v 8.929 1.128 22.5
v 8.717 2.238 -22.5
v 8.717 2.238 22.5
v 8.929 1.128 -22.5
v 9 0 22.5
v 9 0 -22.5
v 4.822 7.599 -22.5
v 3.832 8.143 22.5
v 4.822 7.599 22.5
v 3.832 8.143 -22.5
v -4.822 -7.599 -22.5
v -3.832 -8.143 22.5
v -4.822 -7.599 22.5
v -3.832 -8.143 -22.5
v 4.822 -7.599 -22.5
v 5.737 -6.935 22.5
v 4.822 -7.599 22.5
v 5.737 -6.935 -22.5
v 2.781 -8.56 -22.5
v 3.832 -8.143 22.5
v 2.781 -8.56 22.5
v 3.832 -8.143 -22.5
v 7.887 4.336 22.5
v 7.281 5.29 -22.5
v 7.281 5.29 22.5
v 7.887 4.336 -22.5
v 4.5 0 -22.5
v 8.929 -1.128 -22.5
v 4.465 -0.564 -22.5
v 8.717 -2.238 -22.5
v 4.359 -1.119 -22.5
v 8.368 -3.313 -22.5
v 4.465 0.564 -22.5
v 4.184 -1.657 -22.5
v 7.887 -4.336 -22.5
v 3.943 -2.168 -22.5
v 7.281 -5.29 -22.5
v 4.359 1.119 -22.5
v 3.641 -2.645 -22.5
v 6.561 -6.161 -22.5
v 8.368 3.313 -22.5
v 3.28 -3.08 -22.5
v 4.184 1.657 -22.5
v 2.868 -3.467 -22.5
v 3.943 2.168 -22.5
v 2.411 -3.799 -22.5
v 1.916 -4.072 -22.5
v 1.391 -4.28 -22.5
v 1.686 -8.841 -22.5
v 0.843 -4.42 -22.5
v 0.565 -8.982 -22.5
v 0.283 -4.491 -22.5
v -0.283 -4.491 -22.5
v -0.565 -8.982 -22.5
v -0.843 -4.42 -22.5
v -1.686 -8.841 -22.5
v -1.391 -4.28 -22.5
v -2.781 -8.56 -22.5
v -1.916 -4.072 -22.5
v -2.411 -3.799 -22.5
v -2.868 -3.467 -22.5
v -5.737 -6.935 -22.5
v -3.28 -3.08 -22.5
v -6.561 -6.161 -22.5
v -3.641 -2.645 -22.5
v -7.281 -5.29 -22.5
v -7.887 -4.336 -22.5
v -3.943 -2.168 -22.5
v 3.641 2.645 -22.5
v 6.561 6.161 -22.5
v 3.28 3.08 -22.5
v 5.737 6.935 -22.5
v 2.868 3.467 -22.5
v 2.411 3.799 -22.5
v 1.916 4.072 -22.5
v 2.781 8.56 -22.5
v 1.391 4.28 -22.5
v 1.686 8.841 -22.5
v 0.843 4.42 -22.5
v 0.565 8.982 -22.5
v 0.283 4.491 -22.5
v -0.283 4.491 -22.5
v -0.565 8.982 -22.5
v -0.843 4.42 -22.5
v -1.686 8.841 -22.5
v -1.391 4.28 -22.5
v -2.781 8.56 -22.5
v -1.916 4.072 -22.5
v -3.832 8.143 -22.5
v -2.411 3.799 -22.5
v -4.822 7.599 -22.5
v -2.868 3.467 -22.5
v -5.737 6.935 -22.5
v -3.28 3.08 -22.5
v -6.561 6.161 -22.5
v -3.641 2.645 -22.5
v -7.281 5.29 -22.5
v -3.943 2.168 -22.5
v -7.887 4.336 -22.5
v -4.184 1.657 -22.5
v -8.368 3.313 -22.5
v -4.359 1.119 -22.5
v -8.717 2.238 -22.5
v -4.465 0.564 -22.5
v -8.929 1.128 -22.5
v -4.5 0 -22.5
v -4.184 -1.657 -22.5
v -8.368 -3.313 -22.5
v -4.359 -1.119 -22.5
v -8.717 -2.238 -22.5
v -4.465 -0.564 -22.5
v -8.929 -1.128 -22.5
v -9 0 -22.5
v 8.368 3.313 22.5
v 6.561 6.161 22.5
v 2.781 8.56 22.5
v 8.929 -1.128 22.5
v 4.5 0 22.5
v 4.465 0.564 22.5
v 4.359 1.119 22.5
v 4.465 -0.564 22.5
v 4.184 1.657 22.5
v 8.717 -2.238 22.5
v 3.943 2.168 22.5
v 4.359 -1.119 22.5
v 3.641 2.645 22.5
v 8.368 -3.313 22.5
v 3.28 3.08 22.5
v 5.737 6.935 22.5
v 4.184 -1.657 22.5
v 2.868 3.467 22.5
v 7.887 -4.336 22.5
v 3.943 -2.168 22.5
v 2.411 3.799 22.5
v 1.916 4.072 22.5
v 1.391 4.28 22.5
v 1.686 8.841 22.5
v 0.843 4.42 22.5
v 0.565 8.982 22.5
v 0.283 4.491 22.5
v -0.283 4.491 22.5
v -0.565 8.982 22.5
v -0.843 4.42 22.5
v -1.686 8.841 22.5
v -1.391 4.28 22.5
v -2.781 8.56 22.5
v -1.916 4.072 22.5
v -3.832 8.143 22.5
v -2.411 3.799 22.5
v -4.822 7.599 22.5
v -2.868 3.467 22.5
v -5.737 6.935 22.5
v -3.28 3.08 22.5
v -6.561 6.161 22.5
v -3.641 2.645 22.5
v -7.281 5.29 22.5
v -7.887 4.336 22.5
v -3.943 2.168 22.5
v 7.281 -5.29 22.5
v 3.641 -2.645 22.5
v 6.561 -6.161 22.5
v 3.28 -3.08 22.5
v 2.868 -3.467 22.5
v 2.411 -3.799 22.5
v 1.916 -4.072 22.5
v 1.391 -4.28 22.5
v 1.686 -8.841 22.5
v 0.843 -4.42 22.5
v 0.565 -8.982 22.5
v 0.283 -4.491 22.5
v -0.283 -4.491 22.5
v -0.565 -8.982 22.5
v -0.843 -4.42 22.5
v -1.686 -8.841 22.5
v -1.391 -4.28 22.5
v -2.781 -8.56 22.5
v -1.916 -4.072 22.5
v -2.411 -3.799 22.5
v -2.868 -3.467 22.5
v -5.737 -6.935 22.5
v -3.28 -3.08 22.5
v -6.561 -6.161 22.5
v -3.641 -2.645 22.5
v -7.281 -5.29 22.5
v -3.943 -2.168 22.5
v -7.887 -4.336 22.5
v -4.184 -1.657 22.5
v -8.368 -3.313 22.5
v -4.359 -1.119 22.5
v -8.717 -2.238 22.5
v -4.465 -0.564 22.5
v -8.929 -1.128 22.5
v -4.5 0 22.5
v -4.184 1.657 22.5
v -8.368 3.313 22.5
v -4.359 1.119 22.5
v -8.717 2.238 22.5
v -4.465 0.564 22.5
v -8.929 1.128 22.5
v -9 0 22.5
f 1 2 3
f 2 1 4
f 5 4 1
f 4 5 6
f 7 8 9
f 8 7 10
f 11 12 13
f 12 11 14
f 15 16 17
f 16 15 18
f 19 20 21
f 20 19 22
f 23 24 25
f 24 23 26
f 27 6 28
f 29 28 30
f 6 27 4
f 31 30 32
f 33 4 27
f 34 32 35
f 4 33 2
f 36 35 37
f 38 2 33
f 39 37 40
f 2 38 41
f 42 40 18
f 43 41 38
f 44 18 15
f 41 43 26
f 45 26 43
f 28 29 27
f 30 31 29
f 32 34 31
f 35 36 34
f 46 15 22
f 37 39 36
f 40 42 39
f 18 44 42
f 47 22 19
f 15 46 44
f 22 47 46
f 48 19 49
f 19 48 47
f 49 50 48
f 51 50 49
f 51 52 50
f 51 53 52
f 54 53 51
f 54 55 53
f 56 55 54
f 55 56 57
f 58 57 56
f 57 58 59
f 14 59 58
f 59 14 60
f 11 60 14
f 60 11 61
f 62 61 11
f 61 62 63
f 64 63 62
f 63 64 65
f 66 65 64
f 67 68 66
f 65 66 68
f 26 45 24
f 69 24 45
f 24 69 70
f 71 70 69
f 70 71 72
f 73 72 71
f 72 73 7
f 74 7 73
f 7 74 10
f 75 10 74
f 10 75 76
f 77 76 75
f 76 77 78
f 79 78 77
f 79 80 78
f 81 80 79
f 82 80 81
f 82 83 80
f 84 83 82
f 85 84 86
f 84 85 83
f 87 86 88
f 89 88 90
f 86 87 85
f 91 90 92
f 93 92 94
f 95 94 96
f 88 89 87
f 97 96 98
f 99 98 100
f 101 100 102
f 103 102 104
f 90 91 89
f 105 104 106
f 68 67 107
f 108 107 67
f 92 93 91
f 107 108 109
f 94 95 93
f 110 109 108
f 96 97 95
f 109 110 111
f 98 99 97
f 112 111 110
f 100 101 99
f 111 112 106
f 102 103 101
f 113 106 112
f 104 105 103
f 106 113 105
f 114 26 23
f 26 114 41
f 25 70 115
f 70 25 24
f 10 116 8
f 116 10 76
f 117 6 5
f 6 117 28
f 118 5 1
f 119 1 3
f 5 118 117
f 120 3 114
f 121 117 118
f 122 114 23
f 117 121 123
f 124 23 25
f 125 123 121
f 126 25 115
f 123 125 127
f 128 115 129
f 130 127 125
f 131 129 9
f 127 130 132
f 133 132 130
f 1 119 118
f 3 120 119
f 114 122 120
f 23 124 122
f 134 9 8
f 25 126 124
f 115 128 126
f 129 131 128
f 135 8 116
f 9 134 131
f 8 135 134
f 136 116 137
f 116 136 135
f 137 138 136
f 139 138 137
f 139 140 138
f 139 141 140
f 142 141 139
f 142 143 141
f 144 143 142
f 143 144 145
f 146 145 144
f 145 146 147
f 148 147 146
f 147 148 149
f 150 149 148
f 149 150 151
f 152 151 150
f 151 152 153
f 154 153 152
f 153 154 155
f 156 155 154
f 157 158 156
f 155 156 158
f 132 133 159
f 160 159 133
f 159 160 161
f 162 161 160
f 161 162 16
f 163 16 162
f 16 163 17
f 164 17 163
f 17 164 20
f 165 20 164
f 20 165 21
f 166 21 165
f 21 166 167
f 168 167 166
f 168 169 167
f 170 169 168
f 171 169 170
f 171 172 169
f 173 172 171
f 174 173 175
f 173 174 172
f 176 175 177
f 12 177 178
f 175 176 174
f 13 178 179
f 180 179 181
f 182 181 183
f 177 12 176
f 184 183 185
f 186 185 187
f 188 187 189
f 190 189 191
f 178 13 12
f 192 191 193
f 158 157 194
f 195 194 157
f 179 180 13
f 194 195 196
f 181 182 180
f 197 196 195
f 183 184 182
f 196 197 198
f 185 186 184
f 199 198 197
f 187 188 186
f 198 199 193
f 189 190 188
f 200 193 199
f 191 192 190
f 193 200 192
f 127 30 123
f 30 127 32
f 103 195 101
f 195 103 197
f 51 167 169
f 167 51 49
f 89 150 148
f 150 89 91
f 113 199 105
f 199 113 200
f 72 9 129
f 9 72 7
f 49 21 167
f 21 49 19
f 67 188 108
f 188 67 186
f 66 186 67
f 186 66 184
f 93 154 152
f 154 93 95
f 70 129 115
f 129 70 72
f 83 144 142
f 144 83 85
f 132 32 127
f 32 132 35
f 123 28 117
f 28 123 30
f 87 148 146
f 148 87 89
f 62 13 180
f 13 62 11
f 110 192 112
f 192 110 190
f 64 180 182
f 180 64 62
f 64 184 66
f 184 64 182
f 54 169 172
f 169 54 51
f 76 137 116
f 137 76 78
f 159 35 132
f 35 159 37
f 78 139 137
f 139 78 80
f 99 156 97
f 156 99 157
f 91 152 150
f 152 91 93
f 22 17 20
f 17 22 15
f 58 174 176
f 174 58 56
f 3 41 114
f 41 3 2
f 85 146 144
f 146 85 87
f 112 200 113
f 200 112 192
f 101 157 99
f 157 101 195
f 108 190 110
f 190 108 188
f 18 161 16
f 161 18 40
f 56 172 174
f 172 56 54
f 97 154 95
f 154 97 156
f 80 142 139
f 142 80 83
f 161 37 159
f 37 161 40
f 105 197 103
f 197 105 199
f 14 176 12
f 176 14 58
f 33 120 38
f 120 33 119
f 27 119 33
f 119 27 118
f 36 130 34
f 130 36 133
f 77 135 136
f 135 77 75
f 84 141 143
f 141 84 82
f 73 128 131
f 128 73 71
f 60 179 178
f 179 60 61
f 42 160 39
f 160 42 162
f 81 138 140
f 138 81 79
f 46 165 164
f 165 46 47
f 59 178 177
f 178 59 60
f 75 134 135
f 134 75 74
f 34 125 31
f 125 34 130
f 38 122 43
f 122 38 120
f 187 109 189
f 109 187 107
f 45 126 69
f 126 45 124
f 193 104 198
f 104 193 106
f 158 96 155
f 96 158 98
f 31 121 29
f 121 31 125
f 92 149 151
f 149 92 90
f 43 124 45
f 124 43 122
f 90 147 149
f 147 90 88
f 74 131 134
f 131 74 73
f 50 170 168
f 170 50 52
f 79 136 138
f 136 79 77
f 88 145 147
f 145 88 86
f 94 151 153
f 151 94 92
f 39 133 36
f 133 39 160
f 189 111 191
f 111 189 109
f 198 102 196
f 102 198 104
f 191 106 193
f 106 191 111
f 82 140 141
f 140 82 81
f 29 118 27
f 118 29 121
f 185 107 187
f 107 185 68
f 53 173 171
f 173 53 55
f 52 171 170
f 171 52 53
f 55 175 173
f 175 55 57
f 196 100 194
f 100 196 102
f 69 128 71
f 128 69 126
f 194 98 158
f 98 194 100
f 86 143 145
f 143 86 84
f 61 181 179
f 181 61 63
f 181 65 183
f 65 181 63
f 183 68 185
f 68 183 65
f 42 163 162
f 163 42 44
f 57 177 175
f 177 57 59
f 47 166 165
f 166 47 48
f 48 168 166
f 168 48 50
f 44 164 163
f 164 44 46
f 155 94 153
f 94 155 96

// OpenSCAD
$fn = 50;


difference() {
	union() {
		translate(v = [0, 0, -22.5000000000]) {
			cylinder(h = 45, r = 9.0000000000);
		}
	}
	union() {
		translate(v = [0, 0, -100.0000000000]) {
			cylinder(h = 200, r = 4.5000000000);
		}
	}
}
